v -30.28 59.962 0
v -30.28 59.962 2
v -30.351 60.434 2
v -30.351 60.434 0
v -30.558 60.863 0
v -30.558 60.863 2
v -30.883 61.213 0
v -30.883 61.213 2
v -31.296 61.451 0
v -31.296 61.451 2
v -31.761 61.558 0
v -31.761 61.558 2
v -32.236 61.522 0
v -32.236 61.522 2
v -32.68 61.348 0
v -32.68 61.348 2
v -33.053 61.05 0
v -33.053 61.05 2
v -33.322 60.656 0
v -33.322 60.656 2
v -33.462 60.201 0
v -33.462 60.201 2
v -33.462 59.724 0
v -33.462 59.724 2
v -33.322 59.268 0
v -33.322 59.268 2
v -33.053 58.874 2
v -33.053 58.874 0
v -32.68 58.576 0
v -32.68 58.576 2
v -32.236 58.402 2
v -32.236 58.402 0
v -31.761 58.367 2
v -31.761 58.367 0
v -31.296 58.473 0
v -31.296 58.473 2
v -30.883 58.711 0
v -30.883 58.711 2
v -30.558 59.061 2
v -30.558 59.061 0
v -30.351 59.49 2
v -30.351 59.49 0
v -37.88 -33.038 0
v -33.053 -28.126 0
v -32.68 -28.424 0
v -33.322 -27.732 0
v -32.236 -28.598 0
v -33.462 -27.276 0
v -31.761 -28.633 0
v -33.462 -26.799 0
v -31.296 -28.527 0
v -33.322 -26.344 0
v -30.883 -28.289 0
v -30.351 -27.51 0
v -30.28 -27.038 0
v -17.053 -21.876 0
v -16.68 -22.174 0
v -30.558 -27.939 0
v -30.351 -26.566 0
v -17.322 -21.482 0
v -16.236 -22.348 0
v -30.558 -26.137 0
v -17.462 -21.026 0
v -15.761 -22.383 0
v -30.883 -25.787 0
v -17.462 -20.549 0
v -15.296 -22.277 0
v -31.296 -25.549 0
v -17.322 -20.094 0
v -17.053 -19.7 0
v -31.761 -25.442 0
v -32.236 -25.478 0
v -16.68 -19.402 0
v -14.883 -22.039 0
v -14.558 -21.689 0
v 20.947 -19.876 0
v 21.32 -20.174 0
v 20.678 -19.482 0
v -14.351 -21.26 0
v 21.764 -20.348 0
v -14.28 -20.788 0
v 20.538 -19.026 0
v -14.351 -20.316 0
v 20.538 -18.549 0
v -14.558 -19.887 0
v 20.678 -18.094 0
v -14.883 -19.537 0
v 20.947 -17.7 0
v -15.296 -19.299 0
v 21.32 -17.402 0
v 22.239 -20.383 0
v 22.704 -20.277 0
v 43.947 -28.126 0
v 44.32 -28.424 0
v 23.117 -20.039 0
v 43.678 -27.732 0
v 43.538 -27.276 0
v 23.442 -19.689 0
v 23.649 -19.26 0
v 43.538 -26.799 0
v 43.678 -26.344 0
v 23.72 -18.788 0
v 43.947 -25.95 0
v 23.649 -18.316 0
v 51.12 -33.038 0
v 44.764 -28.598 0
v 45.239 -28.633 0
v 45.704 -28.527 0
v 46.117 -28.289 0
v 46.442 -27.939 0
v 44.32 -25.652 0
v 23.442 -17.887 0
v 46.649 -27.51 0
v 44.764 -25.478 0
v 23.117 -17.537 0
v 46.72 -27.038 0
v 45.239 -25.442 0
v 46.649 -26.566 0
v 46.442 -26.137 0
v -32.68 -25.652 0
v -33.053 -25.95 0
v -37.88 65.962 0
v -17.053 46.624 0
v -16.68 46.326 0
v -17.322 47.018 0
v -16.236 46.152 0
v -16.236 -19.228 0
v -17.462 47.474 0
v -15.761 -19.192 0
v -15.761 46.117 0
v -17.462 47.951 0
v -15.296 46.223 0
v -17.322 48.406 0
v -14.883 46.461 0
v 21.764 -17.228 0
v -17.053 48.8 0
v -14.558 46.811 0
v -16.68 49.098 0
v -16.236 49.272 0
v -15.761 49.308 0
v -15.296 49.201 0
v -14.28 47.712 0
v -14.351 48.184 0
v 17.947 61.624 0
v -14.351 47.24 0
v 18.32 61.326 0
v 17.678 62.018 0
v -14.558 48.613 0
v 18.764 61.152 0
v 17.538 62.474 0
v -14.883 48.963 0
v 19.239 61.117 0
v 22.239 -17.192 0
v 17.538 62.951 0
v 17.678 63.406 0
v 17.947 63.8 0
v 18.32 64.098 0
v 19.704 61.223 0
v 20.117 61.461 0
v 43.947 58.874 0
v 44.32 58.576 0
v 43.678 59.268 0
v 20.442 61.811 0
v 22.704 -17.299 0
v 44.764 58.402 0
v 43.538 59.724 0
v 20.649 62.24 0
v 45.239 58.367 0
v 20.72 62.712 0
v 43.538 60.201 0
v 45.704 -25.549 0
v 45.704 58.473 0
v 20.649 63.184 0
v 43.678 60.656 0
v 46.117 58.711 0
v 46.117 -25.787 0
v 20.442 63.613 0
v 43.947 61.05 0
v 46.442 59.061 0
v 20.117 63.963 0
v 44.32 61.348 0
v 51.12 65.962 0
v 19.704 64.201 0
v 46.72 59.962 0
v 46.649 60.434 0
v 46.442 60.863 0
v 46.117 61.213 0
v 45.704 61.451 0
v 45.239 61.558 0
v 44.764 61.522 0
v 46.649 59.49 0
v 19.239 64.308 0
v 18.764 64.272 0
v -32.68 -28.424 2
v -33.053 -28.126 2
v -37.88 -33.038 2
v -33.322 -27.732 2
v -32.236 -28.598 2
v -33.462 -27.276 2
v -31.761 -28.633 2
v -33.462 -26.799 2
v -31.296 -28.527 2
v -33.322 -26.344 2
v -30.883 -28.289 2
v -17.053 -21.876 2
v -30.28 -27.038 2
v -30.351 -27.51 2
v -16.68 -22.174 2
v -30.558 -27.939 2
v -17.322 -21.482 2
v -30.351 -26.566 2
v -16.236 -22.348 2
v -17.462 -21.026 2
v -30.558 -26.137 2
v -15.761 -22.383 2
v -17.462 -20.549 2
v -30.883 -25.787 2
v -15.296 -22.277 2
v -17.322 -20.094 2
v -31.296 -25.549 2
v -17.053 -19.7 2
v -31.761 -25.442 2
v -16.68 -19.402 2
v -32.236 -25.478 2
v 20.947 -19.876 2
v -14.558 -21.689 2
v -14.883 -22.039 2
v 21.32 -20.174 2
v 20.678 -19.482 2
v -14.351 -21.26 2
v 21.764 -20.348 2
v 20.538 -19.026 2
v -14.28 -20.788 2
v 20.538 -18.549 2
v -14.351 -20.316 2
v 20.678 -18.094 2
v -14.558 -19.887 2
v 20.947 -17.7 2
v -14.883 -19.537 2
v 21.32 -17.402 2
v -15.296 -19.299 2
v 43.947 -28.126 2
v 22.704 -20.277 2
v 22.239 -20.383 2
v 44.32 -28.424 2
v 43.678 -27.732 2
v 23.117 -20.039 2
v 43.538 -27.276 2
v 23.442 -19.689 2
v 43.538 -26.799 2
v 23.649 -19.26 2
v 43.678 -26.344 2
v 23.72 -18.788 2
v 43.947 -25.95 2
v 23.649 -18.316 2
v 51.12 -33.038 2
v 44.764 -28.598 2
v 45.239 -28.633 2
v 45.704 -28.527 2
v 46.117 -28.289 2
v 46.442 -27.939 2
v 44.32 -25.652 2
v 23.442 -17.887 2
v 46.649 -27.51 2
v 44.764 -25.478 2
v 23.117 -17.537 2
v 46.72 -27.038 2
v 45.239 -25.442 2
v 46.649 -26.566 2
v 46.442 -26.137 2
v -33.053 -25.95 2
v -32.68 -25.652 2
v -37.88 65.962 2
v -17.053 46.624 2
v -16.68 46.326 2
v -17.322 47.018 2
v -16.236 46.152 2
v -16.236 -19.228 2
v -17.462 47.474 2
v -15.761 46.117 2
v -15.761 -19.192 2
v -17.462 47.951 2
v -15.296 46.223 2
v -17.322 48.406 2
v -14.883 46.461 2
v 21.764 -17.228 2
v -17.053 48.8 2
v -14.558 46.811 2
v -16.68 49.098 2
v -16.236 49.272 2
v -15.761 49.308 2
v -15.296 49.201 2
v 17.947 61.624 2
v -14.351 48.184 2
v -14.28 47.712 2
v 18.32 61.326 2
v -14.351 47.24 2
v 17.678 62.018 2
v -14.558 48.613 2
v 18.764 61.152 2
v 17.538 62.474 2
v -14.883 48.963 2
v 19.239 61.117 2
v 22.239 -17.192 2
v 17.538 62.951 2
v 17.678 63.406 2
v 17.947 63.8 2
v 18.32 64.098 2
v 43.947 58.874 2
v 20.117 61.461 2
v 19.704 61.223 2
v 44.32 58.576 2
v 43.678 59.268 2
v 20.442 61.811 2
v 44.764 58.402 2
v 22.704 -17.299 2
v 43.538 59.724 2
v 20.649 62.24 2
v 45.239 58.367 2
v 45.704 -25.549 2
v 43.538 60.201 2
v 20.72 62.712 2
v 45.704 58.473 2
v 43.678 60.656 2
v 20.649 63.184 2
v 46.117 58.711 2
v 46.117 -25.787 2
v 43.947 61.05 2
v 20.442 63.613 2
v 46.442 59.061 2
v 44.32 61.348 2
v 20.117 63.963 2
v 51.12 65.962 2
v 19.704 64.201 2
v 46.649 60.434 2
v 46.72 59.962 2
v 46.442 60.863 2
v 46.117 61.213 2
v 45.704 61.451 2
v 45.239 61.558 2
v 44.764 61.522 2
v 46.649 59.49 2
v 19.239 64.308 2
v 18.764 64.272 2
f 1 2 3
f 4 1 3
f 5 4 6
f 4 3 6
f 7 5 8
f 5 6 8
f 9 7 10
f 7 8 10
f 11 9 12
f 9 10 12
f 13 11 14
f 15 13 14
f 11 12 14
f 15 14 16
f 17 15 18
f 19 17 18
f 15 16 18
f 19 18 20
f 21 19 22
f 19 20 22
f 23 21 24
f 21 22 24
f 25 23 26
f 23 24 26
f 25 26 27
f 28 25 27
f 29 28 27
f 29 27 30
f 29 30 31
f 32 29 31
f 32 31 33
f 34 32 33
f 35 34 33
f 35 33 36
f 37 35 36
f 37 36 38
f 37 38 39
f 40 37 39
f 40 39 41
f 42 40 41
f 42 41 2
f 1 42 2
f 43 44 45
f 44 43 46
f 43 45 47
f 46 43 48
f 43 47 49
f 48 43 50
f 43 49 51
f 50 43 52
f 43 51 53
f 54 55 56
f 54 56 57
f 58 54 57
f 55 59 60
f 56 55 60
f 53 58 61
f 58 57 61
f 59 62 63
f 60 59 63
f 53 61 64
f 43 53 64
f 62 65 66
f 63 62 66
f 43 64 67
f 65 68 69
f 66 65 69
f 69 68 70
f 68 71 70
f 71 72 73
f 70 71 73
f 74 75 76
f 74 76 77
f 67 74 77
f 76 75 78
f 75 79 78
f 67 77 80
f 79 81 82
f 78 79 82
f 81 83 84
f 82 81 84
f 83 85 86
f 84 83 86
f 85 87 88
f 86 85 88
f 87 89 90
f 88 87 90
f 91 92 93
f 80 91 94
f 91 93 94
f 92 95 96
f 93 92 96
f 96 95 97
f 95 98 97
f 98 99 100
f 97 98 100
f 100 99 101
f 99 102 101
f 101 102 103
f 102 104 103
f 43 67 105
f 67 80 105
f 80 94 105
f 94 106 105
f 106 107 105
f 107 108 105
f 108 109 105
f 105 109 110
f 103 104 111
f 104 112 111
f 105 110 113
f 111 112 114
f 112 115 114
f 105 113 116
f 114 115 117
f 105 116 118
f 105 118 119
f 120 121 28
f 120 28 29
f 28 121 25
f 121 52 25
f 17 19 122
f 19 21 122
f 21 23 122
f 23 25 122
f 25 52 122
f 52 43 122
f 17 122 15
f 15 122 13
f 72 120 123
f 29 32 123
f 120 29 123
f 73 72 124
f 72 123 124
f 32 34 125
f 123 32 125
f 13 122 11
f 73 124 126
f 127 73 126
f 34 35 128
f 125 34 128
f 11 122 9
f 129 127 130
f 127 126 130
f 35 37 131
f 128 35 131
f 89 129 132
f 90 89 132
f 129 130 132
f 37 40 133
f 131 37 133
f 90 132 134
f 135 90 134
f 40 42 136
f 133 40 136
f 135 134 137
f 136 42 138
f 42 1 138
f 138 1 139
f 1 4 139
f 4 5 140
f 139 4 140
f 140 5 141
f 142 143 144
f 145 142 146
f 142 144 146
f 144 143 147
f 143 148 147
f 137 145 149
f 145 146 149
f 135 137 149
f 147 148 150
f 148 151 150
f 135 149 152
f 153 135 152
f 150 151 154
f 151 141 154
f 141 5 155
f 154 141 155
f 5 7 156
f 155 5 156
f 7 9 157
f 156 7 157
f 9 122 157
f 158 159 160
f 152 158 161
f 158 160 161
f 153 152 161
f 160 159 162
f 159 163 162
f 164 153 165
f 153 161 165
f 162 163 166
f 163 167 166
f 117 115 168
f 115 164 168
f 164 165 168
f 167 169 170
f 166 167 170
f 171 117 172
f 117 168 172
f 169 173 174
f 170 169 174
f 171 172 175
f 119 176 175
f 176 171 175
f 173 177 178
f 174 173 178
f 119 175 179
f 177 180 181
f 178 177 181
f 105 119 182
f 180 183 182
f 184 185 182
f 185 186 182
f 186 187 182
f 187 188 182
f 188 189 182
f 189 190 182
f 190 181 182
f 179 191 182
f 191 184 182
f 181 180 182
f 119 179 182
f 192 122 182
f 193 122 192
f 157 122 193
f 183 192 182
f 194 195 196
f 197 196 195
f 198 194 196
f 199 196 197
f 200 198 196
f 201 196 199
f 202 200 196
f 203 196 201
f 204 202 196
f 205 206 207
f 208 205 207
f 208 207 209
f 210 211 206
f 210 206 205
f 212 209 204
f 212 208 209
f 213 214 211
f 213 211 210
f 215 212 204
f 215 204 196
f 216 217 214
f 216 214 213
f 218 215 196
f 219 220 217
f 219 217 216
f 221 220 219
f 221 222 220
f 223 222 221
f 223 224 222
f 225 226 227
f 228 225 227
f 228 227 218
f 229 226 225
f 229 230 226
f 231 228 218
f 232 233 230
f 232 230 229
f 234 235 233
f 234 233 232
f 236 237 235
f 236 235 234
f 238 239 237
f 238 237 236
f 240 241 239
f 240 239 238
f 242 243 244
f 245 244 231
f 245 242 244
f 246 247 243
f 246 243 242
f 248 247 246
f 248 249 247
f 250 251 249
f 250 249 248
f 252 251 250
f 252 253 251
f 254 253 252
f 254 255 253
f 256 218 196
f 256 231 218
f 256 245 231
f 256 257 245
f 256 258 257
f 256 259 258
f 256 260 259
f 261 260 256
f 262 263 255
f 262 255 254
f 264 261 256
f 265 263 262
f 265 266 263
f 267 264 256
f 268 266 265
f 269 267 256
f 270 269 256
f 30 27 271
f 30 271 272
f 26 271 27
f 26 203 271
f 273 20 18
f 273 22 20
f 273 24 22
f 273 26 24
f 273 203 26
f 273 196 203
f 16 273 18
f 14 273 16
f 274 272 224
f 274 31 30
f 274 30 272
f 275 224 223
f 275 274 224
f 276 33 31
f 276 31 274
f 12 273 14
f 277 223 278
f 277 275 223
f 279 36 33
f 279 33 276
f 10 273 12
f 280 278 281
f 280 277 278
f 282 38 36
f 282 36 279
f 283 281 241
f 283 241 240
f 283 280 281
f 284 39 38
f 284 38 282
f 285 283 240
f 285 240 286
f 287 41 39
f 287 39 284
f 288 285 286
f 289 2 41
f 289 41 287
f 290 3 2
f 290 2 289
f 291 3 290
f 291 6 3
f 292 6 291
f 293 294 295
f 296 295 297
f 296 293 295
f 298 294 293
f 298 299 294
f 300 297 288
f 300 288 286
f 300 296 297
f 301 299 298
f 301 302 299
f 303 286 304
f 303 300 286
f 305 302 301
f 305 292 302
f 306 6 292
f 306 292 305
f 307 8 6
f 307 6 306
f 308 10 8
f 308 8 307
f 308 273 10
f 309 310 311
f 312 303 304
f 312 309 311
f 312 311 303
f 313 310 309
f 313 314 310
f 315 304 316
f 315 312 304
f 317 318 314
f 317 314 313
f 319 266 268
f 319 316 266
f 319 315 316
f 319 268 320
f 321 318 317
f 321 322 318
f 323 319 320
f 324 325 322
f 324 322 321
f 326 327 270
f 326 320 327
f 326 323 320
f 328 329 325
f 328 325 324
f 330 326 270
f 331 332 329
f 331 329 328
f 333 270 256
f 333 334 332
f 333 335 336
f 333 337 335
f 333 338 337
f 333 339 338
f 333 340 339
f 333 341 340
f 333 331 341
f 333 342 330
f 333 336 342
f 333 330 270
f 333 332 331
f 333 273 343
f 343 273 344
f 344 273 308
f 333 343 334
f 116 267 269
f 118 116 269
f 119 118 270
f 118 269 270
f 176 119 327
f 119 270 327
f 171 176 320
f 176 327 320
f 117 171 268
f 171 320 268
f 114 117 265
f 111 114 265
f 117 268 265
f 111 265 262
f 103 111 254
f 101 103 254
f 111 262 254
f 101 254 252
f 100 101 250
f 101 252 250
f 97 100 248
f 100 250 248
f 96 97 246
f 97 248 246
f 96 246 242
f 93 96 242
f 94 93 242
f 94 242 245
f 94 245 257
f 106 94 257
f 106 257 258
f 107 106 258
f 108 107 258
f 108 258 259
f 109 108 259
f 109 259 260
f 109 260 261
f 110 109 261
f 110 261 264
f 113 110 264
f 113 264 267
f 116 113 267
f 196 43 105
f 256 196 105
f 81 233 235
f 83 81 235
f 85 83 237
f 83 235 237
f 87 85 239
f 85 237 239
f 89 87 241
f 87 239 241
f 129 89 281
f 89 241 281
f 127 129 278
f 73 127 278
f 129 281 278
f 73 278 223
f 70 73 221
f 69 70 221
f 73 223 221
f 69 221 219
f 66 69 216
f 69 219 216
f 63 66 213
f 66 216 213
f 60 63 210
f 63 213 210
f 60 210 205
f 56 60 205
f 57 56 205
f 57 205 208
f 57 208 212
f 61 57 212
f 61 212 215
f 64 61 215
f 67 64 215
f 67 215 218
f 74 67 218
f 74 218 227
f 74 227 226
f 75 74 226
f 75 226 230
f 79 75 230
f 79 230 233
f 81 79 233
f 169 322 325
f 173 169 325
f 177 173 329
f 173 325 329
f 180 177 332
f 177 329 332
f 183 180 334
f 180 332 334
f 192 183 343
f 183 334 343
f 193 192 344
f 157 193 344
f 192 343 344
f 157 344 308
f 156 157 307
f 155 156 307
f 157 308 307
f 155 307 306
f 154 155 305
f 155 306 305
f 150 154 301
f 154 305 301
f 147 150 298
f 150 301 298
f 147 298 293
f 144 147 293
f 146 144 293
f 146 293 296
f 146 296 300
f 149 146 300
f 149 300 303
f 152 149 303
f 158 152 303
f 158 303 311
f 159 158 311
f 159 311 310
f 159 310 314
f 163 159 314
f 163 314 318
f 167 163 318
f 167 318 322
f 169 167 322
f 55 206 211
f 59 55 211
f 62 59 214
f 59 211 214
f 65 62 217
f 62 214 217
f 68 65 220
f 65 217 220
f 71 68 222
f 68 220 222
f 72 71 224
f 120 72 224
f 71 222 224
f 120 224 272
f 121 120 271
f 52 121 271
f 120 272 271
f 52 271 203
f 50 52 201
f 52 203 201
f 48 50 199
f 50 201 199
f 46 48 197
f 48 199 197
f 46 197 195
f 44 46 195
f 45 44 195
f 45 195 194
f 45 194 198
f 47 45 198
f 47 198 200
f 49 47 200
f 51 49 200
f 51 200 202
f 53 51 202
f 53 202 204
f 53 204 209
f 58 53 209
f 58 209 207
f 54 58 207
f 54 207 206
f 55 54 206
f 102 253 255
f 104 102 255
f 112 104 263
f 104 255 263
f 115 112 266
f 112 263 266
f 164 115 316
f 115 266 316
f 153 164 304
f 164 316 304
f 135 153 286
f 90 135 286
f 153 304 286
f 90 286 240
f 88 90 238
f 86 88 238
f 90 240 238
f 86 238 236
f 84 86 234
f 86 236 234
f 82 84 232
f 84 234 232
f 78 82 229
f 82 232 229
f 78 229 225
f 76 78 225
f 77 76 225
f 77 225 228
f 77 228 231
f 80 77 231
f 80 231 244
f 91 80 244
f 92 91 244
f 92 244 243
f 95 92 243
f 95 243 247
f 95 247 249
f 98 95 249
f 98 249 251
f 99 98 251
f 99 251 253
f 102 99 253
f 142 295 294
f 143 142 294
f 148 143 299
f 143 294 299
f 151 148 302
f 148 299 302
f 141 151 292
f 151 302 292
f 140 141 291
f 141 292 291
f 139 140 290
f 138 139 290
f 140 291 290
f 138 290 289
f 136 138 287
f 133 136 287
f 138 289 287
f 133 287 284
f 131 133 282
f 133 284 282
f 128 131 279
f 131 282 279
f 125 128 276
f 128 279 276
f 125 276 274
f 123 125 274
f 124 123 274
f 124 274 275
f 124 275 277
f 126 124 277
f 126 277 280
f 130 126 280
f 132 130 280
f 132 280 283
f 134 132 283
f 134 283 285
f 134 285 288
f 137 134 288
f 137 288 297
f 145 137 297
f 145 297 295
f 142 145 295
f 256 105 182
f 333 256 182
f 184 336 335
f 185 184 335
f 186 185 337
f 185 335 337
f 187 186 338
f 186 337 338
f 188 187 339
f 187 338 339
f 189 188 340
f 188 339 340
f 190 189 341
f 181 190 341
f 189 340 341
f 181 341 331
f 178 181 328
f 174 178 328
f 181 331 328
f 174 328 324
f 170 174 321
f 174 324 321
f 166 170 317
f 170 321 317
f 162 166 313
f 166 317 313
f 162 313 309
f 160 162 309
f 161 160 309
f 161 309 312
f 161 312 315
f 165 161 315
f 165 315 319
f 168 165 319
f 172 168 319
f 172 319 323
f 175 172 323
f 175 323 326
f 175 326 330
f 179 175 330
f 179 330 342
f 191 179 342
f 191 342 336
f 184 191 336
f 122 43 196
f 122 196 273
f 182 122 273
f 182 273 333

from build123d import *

# Parameters (mm, degrees)
SKETCH1_W           = 89
SKETCH1_H           = 99
BOSS_EXTRUDE1_DEPTH = 2
SKETCH2_R           = 1.6
CUT_EXTRUDE1_DEPTH  = 84.475926876
SKETCH3_R           = 1.6
CUT_EXTRUDE2_DEPTH  = 84.475926876


with BuildPart() as part:
    # Sketch1 → Boss-Extrude1 (new body)
    with BuildSketch(Plane.XY):
        with Locations((6.61978802, 16.462092452)):
            Rectangle(SKETCH1_W, SKETCH1_H)
    extrude(amount=BOSS_EXTRUDE1_DEPTH)

    # Sketch2 → Cut-Extrude1 (cut, through all)
    with BuildSketch(Plane.XY.offset(2)):
        with Locations((-31.88021198, 59.962092452)):
            Circle(SKETCH2_R)
        with Locations((45.11978802, 59.962092452)):
            Circle(SKETCH2_R)
        with Locations((-31.88021198, -27.037907548)):
            Circle(SKETCH2_R)
        with Locations((45.11978802, -27.037907548)):
            Circle(SKETCH2_R)
    extrude(amount=-CUT_EXTRUDE1_DEPTH, mode=Mode.SUBTRACT)

    # Sketch3 → Cut-Extrude2 (cut, through all)
    with BuildSketch(Plane.XY.offset(2)):
        with Locations((-15.88021198, 47.712092452)):
            Circle(SKETCH3_R)
        with Locations((-15.88021198, -20.787907548)):
            Circle(SKETCH3_R)
        with Locations((19.11978802, 62.712092452)):
            Circle(SKETCH3_R)
        with Locations((22.11978802, -18.787907548)):
            Circle(SKETCH3_R)
    extrude(amount=-CUT_EXTRUDE2_DEPTH, mode=Mode.SUBTRACT)


solid = part.part
